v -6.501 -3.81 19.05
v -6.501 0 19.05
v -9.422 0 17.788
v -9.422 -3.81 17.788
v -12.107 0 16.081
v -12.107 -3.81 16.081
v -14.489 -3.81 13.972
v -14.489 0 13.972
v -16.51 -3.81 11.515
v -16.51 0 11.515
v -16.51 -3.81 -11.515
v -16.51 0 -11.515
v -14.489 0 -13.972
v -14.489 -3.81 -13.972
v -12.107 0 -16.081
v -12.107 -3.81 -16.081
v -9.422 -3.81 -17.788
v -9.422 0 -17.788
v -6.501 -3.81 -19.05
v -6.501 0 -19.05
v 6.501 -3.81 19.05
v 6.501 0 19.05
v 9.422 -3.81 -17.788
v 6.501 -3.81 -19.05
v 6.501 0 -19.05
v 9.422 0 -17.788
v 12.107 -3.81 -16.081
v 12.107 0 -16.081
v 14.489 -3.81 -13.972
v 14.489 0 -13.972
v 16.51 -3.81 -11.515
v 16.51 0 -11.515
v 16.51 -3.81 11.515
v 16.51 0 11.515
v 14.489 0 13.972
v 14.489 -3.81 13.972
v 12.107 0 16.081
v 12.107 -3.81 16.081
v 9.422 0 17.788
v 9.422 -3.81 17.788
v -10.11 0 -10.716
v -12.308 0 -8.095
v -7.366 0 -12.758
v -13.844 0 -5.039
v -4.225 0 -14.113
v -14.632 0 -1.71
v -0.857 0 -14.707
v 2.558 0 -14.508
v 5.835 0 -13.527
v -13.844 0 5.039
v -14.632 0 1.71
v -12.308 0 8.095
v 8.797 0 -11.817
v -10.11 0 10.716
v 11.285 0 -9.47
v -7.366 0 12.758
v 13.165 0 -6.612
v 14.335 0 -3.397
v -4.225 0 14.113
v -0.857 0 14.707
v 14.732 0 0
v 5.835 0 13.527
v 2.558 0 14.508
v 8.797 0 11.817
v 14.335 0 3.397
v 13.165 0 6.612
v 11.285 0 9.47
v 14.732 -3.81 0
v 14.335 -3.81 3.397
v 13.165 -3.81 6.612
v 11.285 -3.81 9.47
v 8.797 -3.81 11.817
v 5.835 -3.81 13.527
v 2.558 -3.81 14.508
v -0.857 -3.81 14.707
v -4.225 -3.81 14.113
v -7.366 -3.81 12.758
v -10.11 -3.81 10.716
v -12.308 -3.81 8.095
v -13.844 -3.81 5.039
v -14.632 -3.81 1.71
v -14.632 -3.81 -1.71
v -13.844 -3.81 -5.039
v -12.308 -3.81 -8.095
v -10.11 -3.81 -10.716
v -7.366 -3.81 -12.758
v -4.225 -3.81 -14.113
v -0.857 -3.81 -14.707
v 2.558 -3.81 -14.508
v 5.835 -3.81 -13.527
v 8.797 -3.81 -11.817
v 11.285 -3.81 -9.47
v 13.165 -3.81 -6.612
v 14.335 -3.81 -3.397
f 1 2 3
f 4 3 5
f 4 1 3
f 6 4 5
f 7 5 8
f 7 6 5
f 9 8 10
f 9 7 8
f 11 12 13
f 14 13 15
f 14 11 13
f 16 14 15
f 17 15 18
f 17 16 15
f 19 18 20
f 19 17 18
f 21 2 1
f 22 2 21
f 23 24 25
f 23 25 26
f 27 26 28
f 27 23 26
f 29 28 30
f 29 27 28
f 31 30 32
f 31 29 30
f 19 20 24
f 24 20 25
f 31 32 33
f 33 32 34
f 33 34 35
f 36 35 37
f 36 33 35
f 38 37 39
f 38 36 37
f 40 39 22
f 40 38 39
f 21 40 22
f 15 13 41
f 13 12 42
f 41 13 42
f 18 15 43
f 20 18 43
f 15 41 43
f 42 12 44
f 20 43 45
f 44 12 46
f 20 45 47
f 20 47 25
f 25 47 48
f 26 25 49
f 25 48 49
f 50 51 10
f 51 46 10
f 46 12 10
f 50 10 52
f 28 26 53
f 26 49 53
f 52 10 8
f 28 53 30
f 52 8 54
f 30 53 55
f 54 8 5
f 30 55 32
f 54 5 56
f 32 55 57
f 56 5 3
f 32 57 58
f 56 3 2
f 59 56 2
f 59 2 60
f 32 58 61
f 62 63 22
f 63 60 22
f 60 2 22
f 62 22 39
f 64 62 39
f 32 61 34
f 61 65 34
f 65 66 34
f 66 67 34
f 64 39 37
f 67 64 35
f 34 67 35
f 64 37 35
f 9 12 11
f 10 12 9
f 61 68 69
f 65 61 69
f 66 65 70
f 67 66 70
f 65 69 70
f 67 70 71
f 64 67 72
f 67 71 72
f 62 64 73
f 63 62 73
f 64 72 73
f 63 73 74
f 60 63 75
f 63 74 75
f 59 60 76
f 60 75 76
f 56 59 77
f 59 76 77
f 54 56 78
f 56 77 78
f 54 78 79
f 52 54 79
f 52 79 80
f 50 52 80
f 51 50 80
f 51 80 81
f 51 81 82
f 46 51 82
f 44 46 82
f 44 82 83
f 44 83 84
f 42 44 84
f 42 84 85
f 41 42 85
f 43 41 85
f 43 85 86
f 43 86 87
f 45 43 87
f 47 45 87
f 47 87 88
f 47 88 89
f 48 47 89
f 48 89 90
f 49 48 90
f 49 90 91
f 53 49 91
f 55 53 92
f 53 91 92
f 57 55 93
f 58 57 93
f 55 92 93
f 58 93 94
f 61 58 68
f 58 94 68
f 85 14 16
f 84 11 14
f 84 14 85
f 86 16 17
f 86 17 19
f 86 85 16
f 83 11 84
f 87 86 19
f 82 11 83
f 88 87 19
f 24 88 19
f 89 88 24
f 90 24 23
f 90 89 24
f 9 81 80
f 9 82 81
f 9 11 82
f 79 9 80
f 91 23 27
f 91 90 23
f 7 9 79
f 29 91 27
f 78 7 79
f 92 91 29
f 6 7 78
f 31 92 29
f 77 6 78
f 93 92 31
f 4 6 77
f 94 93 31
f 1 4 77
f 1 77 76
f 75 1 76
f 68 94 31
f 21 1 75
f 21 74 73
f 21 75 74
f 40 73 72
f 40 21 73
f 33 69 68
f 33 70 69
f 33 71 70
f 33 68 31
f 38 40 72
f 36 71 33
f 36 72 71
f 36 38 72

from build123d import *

# Parameters (mm, degrees)
F0_W     = 33.02
F0_H     = 38.1
F1_DEPTH = 3.81
F2_R     = 25.20878
F2_R_2   = 20.12878
F3_DEPTH = 25.4
F4_R     = 14.732
F5_DEPTH = 25.4


with BuildPart() as f1:
    # F0 (on Front) → F1 (new body)
    with BuildSketch(Plane.XZ):
        Rectangle(F0_W, F0_H)
    extrude(amount=F1_DEPTH)

    # F2 (on face) → F3 (cut)
    with BuildSketch(Plane.XZ.offset(3.81)):
        Circle(F2_R)
        Circle(F2_R_2, mode=Mode.SUBTRACT)
    extrude(amount=-F3_DEPTH, mode=Mode.SUBTRACT)

    # F4 (on face) → F5 (cut)
    with BuildSketch(Plane.XZ.offset(3.81)):
        Circle(F4_R)
    extrude(amount=-F5_DEPTH, mode=Mode.SUBTRACT)


solid = f1.part
